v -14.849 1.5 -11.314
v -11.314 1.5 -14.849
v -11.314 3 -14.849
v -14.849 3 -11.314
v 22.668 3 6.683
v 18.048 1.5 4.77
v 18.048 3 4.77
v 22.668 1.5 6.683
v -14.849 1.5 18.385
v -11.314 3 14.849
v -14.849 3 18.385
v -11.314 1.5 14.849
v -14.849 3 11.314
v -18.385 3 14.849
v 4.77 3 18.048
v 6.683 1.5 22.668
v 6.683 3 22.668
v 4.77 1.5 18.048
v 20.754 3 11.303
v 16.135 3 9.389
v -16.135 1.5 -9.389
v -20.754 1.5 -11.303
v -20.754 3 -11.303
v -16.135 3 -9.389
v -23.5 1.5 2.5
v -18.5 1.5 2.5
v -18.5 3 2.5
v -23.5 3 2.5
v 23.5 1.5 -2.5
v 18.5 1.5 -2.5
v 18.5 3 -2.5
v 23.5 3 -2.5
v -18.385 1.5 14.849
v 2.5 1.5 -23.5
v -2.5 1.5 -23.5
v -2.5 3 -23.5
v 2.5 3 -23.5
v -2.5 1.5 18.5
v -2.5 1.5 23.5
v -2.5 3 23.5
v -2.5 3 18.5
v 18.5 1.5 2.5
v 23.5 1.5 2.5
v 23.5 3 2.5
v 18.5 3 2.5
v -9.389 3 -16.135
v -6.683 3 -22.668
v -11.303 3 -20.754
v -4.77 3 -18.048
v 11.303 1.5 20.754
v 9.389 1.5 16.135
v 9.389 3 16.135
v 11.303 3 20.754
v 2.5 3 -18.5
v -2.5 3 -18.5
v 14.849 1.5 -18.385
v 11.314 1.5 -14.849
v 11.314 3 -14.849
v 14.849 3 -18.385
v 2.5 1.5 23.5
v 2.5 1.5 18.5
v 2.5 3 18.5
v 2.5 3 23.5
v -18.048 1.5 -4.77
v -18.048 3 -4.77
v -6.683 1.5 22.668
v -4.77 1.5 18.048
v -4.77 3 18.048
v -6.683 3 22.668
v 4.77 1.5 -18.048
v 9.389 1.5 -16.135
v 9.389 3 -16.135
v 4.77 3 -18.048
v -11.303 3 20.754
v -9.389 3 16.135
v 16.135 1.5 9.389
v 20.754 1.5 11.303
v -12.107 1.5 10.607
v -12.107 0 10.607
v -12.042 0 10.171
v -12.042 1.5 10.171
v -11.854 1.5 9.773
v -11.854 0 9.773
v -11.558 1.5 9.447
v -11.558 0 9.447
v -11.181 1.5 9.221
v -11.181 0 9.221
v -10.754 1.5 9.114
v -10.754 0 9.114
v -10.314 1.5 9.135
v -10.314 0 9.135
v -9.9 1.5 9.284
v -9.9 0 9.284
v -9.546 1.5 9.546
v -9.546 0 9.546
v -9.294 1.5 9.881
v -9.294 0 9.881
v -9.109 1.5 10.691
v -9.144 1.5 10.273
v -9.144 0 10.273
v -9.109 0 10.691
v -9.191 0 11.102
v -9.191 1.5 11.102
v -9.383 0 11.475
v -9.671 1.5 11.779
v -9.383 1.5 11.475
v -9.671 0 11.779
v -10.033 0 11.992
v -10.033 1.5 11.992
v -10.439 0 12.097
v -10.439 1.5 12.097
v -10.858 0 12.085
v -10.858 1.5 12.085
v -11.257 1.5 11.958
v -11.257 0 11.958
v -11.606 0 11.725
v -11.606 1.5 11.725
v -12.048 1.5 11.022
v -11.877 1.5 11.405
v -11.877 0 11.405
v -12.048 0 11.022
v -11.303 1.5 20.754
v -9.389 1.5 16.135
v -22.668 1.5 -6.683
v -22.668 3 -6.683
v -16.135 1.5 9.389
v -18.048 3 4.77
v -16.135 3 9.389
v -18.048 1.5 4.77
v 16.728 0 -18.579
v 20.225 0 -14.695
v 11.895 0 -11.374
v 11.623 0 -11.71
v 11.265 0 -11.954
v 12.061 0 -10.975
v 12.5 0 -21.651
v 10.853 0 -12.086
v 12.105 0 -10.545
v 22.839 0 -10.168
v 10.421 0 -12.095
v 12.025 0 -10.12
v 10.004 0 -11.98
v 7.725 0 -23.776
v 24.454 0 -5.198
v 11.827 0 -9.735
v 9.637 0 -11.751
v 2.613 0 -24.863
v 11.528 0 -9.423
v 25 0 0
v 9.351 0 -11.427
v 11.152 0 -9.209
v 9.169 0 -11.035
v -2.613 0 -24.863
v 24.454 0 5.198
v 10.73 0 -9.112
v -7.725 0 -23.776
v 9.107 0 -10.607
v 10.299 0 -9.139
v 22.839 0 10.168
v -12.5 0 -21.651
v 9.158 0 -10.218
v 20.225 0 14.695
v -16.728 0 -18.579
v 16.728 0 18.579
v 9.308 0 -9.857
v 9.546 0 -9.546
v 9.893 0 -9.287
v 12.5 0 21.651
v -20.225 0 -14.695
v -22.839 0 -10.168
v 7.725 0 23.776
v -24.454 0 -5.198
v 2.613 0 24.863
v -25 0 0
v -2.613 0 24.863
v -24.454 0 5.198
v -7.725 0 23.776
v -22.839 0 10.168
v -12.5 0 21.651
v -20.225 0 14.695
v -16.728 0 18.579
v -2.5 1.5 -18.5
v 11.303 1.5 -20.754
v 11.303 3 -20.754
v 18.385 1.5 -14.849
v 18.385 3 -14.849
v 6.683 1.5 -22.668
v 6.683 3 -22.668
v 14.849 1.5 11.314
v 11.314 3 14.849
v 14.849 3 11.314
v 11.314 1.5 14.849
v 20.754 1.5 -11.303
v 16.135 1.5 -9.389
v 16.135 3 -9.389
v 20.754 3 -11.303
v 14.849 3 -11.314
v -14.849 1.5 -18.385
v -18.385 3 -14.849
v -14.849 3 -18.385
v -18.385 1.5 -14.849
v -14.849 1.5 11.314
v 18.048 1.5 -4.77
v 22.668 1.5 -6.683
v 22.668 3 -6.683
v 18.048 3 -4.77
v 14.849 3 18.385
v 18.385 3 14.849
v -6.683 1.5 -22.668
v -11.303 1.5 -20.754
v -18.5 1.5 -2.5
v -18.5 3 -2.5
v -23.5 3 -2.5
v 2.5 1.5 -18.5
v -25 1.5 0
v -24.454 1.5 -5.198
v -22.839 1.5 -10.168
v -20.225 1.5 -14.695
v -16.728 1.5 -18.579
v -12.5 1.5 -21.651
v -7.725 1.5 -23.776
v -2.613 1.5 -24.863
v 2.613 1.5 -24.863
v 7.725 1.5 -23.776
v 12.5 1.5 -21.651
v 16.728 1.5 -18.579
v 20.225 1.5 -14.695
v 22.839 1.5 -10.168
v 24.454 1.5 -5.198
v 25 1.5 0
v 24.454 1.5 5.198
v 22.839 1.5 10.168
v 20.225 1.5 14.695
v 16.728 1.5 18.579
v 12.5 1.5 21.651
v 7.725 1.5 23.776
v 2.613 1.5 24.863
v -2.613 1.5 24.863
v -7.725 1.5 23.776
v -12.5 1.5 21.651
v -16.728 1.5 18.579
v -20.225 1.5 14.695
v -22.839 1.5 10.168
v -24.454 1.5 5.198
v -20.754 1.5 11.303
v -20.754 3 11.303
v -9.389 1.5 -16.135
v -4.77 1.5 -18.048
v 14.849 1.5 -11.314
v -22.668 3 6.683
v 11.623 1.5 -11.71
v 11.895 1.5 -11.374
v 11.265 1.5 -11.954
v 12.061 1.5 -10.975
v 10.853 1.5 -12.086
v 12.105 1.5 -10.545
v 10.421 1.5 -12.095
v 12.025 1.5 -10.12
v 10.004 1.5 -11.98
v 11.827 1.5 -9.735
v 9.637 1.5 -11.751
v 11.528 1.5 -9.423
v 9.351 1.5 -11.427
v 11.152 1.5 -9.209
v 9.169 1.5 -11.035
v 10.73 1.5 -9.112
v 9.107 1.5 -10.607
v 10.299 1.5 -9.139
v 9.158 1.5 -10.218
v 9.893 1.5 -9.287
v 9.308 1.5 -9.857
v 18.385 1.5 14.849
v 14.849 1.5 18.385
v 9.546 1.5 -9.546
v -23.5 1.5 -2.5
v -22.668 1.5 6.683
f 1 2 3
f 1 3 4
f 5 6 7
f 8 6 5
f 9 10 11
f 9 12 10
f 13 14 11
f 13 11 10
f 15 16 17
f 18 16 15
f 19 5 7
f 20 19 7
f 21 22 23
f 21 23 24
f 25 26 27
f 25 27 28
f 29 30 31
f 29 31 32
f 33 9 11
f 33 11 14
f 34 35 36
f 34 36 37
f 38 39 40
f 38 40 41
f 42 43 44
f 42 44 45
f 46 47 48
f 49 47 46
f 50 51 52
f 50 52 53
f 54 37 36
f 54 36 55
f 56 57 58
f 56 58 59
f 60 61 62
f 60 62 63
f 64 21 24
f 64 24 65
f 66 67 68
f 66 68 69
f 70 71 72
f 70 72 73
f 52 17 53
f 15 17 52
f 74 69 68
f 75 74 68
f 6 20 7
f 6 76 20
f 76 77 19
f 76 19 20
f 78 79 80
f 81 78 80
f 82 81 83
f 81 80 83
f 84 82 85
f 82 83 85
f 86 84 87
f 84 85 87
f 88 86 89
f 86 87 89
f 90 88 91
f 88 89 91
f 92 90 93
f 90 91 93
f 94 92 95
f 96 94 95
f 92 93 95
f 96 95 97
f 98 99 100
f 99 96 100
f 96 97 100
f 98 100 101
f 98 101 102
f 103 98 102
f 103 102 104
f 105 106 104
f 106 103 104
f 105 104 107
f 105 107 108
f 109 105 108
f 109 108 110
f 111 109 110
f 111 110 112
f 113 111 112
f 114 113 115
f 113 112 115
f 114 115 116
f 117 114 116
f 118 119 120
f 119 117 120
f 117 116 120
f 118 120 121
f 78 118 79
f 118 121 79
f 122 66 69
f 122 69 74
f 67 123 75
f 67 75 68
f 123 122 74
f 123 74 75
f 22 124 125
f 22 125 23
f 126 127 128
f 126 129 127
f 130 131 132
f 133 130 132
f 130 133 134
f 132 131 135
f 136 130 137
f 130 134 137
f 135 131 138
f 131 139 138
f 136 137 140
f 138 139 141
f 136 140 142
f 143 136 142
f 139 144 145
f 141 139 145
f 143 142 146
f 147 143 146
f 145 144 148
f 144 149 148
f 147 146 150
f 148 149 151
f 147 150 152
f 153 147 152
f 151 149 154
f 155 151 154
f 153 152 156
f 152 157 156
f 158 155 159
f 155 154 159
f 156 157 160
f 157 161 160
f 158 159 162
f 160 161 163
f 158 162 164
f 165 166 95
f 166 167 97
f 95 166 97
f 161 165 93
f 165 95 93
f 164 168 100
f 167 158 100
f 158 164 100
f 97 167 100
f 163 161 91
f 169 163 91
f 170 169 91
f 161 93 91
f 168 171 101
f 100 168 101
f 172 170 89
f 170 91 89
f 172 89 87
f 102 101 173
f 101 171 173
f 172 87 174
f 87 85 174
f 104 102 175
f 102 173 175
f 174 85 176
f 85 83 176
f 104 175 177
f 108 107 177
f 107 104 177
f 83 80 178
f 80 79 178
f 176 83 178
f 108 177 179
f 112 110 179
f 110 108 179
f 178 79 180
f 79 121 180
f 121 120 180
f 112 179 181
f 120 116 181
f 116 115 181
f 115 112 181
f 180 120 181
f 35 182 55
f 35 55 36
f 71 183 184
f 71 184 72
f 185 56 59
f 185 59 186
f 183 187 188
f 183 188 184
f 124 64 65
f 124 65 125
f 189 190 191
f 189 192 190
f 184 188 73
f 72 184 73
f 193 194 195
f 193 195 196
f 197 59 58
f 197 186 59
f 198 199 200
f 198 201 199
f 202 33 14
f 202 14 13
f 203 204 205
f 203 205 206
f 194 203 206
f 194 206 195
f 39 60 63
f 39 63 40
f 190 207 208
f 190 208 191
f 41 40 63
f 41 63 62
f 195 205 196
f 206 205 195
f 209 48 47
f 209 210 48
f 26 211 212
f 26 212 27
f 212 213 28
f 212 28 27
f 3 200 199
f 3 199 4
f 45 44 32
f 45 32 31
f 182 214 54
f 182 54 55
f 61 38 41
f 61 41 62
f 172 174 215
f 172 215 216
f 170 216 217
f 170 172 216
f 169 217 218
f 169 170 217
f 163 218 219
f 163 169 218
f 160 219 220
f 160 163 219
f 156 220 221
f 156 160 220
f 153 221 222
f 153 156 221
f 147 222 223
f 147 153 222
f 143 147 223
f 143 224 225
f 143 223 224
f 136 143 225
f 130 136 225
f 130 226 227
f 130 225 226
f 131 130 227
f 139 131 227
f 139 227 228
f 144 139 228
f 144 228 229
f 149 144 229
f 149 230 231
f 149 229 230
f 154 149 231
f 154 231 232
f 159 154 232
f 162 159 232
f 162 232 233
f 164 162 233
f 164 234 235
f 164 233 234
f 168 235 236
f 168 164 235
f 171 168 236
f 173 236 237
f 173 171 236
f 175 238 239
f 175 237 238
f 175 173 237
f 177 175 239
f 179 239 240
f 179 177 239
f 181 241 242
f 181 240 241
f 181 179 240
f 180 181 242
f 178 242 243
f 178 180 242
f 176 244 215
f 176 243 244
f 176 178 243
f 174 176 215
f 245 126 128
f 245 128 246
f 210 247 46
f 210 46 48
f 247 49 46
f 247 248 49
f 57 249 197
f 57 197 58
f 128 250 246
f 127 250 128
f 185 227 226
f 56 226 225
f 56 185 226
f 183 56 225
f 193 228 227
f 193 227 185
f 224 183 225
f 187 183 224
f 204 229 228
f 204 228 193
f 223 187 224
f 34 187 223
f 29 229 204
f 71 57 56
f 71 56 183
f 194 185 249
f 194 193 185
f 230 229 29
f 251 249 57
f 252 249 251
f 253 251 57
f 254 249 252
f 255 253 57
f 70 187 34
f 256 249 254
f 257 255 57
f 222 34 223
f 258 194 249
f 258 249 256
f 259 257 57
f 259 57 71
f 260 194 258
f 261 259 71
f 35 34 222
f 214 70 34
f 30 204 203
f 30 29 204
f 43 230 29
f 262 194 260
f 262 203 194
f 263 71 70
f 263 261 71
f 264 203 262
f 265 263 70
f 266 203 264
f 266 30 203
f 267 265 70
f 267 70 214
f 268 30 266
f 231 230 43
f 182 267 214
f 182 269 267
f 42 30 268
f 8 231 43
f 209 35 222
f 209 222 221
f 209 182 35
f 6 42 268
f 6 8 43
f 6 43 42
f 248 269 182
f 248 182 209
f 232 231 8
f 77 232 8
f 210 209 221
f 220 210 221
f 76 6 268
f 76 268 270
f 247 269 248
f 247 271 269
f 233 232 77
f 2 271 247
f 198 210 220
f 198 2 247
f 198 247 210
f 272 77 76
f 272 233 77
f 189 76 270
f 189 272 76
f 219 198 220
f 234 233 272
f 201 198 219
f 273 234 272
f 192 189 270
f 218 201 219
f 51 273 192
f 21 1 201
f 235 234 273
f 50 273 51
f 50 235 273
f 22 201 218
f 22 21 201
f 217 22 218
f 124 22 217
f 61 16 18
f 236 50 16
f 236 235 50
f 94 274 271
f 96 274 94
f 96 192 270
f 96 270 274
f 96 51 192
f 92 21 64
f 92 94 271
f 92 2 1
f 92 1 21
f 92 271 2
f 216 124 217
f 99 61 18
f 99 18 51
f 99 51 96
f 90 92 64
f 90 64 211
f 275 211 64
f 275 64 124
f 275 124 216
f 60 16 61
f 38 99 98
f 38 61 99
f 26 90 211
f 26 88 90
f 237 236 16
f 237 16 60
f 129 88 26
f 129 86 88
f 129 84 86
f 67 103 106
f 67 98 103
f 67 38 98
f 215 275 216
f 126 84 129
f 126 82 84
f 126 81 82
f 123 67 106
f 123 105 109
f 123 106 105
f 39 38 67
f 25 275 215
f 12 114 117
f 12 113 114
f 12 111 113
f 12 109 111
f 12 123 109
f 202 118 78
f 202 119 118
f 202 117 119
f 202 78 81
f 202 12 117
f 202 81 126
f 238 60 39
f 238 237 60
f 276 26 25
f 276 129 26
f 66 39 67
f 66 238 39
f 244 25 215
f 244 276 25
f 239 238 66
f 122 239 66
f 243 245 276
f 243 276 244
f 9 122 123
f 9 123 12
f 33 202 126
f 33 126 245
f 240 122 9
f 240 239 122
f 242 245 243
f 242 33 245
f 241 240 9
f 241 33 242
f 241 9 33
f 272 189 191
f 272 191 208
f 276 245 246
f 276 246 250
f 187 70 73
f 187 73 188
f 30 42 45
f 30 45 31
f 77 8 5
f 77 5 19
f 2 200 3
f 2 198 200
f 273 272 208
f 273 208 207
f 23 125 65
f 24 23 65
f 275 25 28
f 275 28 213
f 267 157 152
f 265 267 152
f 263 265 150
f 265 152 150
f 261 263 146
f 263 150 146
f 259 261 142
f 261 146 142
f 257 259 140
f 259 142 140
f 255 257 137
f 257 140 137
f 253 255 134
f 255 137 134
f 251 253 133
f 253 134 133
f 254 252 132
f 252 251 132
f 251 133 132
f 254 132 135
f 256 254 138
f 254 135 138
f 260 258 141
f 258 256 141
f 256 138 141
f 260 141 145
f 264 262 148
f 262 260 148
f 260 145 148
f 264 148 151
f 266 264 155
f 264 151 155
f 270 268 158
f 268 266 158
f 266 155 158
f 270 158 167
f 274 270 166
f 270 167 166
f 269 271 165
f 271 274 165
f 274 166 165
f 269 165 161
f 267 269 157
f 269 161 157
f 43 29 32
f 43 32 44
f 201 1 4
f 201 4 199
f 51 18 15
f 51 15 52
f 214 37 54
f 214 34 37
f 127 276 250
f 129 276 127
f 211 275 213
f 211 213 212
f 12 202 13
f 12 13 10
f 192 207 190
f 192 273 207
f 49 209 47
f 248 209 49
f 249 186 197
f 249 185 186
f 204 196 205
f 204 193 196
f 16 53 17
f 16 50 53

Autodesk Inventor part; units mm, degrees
ref_plane "YZ Plane" through (0, 0, 0) normal (1, 0, 0) x (0, 1, 0)
ref_plane "XZ Plane" through (0, 0, 0) normal (0, 1, 0) x (-1, 0, 0)
ref_plane "XY Plane" through (0, 0, 0) normal (0, 0, 1) x (1, 0, 0)
sketch "Sketch1" plane through (0, 0, 0) normal (0, 1, 0) x (-1, 0, 0)
  circle A0 centre (0, 0) radius 25
  line L0 (0, 0) -> (10.6066, 10.6066)
  line L1 (0, 0) -> (15, 0) construction
  circle A1 centre (10.6066, 10.6066) radius 1.5
  line L2 (0, 0) -> (-10.6066, -10.6066)
  line L3 (0, 0) -> (15, 0) construction
  circle A2 centre (-10.6066, -10.6066) radius 1.5
  dimension "d0" = 50
  dimension "d1" = 15
  dimension "d2" = 45
  dimension "d3" = 3
  dimension "d4" = 15
  dimension "d5" = 135
  dimension "d6" = 3
extrude "Extrusion1" add sketch "Sketch1" along normal blind 1.5
sketch "Sketch2" plane through (0, 1.5, 0) normal (0, 1, 0) x (1, 0, 0)
  line L0 (0, 0) -> (-23.5, 0)
  line L1 (0, 0) -> (23.5, 0) construction
  line L2 (-23.5, 0) -> (-23.5, 2.5)
  line L3 (-23.5, 2.5) -> (-18.5, 2.5)
  line L4 (-18.5, 2.5) -> (-18.5, -2.5)
  line L5 (-18.5, -2.5) -> (-23.5, -2.5)
  line L6 (-23.5, -2.5) -> (-23.5, 2.5)
  dimension "d9" = 23.5
  dimension "d10" = 180
  dimension "d11" = 2.5
  dimension "d12" = 90
  dimension "d13" = 5
  dimension "d14" = 5
extrude "Extrusion2" add sketch "Sketch2" along normal blind 1.5
pattern_circular "Circular Pattern1" count 16 over 360 about axis through (0, 0, 0) along (0, 1, 0) of "Extrusion2"
properties part number "WifiPixels"
